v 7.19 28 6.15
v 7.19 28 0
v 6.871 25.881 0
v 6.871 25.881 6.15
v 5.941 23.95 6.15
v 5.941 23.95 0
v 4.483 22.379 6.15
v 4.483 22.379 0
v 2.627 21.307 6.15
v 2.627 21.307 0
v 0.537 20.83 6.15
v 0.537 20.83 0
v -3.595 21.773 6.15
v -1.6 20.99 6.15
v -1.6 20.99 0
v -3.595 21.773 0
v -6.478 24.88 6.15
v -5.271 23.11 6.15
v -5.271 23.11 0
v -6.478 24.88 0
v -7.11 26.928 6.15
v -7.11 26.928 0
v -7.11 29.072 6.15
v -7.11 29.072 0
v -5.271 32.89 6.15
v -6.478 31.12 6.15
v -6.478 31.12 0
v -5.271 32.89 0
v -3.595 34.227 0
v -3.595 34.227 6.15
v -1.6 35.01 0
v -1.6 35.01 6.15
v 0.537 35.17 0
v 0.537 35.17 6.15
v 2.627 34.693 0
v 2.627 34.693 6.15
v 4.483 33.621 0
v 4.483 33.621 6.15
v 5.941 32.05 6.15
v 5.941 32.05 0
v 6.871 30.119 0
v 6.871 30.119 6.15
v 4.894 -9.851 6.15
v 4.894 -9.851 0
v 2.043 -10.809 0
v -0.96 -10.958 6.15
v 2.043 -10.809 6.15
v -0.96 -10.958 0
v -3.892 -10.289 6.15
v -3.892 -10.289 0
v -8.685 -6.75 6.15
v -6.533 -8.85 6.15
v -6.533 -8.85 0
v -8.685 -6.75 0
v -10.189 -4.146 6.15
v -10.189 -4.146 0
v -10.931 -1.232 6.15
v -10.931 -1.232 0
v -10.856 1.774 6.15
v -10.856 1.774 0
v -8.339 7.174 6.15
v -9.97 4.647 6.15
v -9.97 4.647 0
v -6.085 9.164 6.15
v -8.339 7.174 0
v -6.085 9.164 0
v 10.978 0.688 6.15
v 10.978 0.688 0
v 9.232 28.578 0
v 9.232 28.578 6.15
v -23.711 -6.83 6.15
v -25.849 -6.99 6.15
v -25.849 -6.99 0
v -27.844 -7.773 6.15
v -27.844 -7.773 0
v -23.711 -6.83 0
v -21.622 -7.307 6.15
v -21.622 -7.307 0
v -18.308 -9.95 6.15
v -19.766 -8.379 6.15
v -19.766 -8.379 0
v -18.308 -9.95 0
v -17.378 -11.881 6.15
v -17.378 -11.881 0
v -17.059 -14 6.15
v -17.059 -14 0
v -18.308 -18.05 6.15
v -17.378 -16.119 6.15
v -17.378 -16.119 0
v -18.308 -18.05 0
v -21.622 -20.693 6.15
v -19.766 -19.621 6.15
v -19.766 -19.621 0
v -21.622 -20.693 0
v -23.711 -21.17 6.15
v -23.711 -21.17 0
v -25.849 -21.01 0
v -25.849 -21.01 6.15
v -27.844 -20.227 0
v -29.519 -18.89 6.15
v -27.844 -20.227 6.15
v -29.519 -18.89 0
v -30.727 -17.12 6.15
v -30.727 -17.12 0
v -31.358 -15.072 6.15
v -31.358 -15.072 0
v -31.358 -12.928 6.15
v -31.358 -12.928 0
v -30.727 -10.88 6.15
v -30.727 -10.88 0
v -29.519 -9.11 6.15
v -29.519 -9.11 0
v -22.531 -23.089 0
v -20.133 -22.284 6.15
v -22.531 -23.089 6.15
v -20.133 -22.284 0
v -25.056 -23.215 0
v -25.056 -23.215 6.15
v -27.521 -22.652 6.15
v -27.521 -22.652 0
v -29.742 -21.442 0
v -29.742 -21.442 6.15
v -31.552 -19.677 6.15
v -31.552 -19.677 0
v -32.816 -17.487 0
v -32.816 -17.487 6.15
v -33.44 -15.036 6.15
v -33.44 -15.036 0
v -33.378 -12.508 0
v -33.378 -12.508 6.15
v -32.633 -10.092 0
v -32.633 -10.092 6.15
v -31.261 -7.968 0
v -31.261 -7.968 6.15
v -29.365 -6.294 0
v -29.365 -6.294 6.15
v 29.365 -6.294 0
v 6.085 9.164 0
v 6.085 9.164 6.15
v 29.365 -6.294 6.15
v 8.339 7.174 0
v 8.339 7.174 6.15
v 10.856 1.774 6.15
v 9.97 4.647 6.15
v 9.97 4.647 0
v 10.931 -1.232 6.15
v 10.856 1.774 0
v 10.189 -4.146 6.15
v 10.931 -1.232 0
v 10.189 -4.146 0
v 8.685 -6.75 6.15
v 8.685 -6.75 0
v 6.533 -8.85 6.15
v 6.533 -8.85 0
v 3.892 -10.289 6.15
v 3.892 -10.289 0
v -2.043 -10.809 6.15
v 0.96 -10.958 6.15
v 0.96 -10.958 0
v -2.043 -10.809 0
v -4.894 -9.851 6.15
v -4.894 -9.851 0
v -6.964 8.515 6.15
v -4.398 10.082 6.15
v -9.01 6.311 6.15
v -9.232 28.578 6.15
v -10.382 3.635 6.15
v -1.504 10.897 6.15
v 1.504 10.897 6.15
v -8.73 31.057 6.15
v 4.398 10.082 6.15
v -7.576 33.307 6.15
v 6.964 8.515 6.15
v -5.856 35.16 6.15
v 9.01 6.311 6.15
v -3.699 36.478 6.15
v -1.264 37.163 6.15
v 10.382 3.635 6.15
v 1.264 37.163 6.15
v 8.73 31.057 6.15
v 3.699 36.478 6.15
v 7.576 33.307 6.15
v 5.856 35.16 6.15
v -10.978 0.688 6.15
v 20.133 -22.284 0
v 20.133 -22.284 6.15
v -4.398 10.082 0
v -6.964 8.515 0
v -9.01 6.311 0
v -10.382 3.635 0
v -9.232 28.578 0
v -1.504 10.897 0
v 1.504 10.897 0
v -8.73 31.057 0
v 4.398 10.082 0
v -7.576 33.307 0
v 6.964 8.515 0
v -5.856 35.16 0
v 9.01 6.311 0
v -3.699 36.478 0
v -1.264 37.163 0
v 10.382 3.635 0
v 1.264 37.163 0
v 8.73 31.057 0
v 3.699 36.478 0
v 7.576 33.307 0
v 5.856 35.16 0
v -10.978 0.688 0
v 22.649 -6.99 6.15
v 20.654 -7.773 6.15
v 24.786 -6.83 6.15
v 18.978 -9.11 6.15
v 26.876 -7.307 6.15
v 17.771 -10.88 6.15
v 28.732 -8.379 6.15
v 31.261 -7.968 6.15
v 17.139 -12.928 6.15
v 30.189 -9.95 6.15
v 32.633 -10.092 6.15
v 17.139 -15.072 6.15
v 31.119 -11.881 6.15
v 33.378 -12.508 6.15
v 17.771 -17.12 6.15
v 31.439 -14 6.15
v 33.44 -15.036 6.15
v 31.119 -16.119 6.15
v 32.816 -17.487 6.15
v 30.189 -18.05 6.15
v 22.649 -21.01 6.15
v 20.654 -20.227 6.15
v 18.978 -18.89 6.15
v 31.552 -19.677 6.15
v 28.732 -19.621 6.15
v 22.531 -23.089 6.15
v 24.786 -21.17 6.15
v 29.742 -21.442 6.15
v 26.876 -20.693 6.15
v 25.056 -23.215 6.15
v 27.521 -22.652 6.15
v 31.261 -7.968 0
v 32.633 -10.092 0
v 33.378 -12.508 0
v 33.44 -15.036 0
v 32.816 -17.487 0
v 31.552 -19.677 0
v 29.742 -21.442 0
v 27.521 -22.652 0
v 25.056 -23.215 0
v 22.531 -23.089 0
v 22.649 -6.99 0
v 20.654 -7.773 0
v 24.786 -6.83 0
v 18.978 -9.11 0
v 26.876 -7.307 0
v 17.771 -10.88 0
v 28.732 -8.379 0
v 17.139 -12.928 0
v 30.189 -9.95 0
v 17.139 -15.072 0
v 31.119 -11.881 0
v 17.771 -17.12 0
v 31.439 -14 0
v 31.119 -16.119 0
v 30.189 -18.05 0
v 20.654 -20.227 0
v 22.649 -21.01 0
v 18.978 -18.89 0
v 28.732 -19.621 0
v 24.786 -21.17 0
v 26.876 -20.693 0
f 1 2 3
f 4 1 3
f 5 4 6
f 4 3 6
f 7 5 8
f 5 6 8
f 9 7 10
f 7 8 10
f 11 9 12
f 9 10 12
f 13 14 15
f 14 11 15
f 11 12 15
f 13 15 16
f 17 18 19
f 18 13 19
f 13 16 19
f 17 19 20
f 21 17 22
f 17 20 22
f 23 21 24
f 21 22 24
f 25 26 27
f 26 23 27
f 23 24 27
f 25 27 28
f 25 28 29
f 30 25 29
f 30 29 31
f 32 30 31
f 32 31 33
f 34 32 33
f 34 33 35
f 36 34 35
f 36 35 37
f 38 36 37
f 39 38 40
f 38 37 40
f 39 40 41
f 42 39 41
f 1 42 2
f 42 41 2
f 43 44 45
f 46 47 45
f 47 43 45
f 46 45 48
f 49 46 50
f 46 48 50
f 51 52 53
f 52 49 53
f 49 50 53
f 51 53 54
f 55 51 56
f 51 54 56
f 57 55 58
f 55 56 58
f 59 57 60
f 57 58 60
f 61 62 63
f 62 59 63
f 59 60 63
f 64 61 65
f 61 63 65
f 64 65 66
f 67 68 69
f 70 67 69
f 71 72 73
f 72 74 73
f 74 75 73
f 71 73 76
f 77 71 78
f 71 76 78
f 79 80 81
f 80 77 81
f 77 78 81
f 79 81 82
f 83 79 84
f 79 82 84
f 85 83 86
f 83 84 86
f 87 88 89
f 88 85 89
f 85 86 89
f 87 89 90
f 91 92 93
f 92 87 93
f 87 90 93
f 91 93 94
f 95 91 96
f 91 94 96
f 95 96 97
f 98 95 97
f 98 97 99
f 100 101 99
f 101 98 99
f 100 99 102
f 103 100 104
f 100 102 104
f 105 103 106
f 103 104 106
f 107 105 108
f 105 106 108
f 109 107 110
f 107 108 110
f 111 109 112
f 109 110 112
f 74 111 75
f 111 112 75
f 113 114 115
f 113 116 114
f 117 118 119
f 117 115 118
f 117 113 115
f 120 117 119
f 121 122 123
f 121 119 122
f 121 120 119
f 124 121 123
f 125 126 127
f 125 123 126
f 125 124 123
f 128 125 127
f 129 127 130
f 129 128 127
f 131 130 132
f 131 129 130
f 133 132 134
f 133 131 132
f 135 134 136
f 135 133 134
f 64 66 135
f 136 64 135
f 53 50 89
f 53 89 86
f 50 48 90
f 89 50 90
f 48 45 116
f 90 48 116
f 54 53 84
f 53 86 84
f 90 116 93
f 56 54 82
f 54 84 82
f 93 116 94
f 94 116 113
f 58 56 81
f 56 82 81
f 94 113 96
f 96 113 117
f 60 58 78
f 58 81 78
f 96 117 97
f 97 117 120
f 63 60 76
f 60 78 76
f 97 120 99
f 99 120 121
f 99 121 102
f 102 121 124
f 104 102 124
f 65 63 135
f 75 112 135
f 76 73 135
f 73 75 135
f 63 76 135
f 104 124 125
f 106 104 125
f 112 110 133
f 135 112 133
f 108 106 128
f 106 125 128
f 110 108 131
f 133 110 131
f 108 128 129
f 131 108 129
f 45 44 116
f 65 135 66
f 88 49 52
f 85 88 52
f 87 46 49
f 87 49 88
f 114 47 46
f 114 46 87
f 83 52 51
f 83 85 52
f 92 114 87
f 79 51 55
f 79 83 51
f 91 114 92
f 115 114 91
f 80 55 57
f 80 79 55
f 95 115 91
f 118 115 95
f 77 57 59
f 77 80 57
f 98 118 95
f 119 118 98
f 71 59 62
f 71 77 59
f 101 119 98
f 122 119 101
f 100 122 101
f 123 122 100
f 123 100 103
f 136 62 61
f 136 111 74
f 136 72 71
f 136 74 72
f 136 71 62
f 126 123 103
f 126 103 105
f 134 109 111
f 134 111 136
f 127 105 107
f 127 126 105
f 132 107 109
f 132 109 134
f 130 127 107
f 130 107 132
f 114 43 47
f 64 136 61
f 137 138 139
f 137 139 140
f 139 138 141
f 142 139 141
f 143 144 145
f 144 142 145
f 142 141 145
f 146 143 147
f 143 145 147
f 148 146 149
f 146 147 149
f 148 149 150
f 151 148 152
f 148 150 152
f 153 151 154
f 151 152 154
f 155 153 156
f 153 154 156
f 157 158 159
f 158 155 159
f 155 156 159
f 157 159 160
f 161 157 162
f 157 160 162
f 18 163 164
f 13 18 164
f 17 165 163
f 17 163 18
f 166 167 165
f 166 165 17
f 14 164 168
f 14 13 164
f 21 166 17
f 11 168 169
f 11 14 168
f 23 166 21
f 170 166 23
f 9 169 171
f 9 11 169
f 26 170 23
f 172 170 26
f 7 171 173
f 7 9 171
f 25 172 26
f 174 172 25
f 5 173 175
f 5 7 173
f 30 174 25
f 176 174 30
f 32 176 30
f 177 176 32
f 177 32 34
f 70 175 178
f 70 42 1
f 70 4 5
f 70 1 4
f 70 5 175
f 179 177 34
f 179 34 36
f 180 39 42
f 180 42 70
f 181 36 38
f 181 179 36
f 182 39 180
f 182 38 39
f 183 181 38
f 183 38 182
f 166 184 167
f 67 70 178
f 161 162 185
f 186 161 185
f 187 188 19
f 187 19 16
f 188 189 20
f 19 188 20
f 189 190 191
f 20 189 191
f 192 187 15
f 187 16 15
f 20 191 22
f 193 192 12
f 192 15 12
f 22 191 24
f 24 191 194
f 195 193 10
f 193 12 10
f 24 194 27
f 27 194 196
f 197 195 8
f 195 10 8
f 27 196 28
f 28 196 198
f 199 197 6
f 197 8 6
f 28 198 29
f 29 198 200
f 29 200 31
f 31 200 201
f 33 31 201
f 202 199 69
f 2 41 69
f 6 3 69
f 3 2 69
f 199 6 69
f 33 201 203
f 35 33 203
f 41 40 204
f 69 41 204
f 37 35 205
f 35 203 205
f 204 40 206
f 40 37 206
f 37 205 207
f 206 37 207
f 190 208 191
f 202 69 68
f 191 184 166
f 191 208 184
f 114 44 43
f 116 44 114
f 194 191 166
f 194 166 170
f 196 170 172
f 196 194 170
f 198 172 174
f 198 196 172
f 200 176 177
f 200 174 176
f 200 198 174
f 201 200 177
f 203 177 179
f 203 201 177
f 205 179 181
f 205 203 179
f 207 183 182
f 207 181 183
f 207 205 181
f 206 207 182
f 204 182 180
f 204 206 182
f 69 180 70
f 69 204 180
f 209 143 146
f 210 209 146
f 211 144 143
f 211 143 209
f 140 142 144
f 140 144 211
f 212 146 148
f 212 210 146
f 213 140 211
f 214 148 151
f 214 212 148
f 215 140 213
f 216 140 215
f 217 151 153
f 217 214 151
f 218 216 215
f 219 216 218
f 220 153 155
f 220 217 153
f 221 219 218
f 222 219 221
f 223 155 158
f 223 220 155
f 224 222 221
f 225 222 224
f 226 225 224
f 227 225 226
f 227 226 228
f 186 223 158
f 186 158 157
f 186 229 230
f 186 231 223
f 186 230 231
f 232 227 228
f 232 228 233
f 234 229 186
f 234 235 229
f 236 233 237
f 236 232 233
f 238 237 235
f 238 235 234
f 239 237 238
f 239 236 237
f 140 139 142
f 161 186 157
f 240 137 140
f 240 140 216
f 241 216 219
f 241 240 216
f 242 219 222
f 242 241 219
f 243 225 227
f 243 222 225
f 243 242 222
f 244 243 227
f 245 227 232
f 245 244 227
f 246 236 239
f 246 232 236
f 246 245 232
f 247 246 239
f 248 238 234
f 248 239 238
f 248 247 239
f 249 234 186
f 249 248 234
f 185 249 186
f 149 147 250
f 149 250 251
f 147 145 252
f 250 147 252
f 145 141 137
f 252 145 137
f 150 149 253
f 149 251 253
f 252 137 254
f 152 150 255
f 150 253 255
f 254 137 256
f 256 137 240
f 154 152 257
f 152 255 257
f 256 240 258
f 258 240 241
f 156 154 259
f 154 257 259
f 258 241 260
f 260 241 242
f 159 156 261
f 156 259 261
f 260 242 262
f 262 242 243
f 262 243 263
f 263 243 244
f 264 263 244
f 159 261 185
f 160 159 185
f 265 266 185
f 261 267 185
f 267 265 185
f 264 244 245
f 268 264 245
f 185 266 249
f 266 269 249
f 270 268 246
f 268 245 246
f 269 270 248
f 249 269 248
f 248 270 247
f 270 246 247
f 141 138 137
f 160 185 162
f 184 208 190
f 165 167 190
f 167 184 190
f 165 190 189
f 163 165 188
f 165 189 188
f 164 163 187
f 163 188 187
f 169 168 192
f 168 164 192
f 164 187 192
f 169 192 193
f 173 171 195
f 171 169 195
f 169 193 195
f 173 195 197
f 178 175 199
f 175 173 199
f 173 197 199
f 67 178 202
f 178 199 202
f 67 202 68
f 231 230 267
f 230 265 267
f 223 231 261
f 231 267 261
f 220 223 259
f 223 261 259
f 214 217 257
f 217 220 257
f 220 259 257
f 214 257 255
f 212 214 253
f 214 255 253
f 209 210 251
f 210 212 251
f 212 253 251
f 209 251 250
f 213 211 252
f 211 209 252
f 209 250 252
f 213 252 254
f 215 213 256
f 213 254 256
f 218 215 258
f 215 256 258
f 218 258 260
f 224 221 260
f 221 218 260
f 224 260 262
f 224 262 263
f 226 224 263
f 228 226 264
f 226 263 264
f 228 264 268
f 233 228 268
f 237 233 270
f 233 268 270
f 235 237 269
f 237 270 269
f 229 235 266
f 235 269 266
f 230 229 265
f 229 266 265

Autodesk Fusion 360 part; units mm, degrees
sketch "Sketch1" plane through (0, 0, 0) normal (0, 0, 1) x (1, 0, 0)
  circle A0 centre (0, 0) radius 11
  circle A1 centre (0, 28) radius 7.19
  circle A2 centre (0, 28) radius 9.25
  line L0 (-10.9785, 0.6875) -> (-9.2319, 28.5781)
  line L1 (10.9785, 0.6875) -> (9.2319, 28.5781)
  dimension "d1" = 22
  dimension "d3" = 14.38
  dimension "d5" = 18.5
sketch "Sketch3" plane through (0, 0, 0) normal (0, 0, 1) x (1, 0, 0)
  line L0 (-0.0645, 35.1897) -> (-6.2587, 31.539)
  line L1 (-6.2587, 31.539) -> (-6.1942, 24.3493)
  line L2 (-6.1942, 24.3493) -> (0.0645, 20.8103)
  line L3 (0.0645, 20.8103) -> (6.2587, 24.461)
  line L4 (6.2587, 24.461) -> (6.1942, 31.6507)
  line L5 (6.1942, 31.6507) -> (-0.0645, 35.1897)
  point P0 (0, 28)
  dimension "d7" = 7.19
extrude "Extrude1" add sketch "Sketch1" along normal blind 6.15 contours A0 A2 L0 L1 | A2 makes body 1
pattern_circular "C-Pattern1" count 3 over 360 about axis through (0, 0, 1.75) along (0, 0, 1) of bodies 1 makes body 2 at (-13.2292, -17.0879, 0) makes body 3 at (21.4131, -2.9129, 0)
sketch "Sketch2" plane through (0, 0, 0) normal (0, 0, 1) x (1, 0, 0)
  line L0 (6.1908, 38.6565) -> (-0.0712, 42.1896)
  line L1 (-0.0712, 42.1896) -> (-6.262, 38.5331)
  line L2 (-6.262, 38.5331) -> (-6.1908, 31.3435)
  line L3 (-6.1908, 31.3435) -> (0.0712, 27.8104)
  line L4 (0.0712, 27.8104) -> (6.262, 31.4669)
  line L5 (6.262, 31.4669) -> (6.1908, 38.6565)
  point P0 (0, 35)
  dimension "d6" = 7.19
